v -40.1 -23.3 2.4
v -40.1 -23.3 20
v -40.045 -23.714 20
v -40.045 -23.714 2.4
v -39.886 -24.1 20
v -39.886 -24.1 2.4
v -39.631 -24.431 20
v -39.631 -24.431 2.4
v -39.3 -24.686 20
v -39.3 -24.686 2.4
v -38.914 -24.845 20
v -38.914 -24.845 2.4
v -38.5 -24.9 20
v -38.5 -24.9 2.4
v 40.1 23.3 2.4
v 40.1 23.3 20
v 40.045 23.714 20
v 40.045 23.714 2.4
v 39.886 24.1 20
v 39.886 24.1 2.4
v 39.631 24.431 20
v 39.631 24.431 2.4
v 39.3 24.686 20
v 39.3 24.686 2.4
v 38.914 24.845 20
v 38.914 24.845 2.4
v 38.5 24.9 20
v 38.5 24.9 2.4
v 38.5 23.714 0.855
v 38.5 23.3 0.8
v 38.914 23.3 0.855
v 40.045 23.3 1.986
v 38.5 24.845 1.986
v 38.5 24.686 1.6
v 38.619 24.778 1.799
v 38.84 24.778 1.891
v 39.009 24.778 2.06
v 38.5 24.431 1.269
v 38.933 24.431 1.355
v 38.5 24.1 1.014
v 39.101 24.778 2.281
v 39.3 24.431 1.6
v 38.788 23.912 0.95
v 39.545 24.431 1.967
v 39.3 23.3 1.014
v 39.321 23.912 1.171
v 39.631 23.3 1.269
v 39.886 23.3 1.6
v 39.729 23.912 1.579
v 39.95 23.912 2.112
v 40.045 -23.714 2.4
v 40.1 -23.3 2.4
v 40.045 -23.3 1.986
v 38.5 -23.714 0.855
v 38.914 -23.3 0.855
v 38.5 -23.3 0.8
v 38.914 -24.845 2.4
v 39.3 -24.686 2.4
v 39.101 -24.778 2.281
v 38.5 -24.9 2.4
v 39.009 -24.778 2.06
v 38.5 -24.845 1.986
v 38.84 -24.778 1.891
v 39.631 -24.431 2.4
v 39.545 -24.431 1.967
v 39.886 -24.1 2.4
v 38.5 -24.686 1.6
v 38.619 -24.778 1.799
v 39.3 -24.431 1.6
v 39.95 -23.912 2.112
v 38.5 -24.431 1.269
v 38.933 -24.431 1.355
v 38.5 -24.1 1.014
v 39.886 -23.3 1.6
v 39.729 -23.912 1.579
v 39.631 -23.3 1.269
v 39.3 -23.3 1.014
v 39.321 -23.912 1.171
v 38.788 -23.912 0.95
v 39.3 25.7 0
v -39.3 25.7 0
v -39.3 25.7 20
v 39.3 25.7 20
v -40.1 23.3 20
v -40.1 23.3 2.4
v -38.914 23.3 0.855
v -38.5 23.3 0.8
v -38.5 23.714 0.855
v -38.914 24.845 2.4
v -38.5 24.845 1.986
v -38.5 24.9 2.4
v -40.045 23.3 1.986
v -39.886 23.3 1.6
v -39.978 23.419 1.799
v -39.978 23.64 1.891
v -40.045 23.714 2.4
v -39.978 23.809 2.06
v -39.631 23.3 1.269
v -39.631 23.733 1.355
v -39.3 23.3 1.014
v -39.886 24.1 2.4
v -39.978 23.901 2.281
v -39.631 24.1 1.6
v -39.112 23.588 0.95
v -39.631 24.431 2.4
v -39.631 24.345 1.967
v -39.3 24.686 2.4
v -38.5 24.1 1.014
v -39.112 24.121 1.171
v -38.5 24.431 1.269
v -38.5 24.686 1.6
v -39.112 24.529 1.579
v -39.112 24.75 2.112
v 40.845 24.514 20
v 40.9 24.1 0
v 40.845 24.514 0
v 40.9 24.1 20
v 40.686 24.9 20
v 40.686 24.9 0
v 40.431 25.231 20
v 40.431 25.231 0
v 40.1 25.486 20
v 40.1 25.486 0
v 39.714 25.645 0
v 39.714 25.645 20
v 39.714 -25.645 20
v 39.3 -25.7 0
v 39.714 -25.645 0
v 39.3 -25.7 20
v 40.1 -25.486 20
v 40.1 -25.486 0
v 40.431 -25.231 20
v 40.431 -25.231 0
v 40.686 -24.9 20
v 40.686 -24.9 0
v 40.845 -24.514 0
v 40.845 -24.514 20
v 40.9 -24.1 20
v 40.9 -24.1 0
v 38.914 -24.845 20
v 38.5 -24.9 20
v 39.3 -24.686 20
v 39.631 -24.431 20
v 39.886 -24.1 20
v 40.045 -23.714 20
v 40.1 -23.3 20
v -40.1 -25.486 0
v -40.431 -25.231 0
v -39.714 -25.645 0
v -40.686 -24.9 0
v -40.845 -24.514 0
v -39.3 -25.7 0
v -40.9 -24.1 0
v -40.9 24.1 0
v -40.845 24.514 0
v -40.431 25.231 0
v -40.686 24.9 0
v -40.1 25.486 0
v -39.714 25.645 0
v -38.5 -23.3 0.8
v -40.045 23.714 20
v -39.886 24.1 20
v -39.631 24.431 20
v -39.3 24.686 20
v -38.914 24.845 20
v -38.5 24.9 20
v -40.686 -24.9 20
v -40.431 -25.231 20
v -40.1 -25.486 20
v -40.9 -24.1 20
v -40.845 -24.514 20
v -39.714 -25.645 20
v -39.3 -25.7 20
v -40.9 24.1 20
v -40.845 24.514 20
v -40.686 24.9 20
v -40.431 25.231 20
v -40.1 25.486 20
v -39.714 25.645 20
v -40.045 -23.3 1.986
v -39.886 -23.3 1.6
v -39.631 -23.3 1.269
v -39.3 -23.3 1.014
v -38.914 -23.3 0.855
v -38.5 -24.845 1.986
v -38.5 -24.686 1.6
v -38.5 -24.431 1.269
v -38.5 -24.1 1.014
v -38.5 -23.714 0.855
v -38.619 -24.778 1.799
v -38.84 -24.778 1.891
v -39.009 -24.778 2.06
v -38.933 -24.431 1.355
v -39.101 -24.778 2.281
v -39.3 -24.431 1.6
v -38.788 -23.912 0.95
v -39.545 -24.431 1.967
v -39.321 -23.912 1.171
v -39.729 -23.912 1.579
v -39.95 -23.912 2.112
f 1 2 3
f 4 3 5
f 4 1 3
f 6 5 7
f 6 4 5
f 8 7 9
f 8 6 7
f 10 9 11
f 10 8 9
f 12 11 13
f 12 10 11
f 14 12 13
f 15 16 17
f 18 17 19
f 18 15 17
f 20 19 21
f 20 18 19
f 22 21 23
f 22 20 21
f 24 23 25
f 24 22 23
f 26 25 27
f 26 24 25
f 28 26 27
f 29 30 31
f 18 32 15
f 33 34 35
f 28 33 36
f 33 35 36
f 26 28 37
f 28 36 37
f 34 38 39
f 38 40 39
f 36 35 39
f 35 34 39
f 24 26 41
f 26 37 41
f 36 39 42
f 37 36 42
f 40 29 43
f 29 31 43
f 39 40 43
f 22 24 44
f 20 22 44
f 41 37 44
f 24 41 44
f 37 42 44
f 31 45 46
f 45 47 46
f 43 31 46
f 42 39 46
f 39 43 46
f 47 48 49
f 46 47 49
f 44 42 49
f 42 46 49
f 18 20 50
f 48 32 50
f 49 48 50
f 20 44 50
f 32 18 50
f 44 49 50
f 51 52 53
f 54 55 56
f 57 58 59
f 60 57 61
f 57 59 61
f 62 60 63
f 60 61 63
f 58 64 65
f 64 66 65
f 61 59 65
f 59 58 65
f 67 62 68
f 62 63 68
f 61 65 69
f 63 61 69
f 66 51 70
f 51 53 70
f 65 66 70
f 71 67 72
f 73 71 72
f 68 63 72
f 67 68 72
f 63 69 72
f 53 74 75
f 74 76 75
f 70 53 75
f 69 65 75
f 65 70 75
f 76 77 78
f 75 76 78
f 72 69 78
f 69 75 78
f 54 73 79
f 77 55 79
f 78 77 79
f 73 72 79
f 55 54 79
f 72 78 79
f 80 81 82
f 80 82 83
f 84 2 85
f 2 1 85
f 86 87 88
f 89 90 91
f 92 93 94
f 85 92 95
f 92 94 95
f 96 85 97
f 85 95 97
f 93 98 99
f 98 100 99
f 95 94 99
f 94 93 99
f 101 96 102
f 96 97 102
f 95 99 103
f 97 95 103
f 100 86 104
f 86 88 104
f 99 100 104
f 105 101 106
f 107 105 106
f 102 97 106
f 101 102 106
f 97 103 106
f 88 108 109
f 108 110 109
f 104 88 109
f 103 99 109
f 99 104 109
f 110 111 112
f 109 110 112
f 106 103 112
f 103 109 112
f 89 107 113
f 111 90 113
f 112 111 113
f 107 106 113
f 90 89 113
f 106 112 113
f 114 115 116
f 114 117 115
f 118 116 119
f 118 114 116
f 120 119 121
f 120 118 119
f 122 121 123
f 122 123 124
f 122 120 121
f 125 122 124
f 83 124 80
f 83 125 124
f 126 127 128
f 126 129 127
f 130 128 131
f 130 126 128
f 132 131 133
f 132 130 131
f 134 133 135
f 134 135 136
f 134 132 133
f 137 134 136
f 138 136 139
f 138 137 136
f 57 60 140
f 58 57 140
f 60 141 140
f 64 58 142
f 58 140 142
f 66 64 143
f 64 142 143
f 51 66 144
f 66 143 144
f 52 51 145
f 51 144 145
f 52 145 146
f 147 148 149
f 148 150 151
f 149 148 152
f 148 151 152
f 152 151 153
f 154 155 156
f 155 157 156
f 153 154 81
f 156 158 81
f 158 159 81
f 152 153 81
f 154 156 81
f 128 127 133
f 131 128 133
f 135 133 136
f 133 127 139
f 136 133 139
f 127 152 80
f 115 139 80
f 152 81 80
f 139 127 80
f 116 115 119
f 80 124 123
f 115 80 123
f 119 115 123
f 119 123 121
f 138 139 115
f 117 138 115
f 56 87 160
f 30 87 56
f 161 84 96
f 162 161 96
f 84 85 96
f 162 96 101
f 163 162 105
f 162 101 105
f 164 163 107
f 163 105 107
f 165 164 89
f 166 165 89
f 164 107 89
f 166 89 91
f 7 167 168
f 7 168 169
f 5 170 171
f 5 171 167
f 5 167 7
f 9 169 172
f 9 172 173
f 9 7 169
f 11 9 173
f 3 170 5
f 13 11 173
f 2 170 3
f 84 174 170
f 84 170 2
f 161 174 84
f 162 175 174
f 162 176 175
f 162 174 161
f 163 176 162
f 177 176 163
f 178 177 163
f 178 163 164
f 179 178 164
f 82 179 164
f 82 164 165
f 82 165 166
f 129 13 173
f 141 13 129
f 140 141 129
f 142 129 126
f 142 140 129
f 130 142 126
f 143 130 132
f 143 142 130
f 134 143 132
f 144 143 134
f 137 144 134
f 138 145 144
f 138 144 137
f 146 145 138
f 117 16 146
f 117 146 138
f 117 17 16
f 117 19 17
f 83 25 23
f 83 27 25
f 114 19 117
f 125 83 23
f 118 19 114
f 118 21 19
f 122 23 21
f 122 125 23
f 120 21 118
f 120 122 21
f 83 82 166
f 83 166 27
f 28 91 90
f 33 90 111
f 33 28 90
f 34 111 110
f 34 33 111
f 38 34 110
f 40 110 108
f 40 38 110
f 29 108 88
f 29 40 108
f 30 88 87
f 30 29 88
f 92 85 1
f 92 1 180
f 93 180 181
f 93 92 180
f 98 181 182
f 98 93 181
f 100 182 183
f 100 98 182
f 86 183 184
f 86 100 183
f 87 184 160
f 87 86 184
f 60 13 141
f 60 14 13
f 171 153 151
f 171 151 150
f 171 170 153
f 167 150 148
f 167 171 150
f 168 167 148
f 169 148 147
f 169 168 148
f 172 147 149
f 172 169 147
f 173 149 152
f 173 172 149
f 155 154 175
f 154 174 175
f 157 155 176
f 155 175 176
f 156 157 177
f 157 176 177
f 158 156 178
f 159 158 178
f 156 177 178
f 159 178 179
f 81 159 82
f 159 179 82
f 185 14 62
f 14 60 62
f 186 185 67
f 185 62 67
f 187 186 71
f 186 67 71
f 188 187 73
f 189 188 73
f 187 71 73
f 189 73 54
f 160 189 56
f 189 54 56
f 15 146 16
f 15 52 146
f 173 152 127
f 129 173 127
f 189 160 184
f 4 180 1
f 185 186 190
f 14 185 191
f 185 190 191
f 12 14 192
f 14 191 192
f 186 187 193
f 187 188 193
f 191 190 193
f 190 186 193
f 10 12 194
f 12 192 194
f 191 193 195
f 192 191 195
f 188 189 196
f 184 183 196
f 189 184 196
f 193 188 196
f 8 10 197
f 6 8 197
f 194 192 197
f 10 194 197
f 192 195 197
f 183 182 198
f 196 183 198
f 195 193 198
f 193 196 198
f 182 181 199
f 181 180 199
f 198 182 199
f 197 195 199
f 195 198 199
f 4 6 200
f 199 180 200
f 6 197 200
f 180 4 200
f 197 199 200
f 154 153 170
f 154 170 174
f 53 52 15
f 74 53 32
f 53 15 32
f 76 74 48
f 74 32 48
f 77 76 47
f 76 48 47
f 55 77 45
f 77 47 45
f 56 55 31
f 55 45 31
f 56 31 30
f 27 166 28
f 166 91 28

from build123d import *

# Parameters (mm, degrees)
ESQUISSE1_W        = 81.8
ESQUISSE1_H        = 51.4
BOSS_EXTRU_1_DEPTH = 20
COQUE1_T           = -0.8
CONG_1_R           = 1.6


with BuildPart() as part:
    # Esquisse1 → Boss.-Extru.1 (new body)
    with BuildSketch(Plane.XY):
        Rectangle(ESQUISSE1_W, ESQUISSE1_H)
    extrude(amount=BOSS_EXTRU_1_DEPTH)

    # Coque1
    coque1_openings = [part.faces().sort_by_distance(p)[0] for p in [
        (0, 0, 20),
    ]]
    offset(amount=COQUE1_T, openings=coque1_openings, kind=Kind.INTERSECTION)

    # Congé1
    cong_1_edges = [part.edges().sort_by_distance(p)[0] for p in [
        (40.1, 0, 0.8),
        (40.1, -24.9, 10.4),
        (0, 24.9, 0.8),
        (40.1, 24.9, 10.4),
        (-40.1, 0, 0.8),
        (-40.1, 24.9, 10.4),
        (0, -24.9, 0.8),
        (-40.1, -24.9, 10.4),
        (40.9, -25.7, 10),
        (-40.9, -25.7, 10),
        (-40.9, 25.7, 10),
        (40.9, 25.7, 10),
    ]]
    fillet(cong_1_edges, radius=CONG_1_R)


solid = part.part
